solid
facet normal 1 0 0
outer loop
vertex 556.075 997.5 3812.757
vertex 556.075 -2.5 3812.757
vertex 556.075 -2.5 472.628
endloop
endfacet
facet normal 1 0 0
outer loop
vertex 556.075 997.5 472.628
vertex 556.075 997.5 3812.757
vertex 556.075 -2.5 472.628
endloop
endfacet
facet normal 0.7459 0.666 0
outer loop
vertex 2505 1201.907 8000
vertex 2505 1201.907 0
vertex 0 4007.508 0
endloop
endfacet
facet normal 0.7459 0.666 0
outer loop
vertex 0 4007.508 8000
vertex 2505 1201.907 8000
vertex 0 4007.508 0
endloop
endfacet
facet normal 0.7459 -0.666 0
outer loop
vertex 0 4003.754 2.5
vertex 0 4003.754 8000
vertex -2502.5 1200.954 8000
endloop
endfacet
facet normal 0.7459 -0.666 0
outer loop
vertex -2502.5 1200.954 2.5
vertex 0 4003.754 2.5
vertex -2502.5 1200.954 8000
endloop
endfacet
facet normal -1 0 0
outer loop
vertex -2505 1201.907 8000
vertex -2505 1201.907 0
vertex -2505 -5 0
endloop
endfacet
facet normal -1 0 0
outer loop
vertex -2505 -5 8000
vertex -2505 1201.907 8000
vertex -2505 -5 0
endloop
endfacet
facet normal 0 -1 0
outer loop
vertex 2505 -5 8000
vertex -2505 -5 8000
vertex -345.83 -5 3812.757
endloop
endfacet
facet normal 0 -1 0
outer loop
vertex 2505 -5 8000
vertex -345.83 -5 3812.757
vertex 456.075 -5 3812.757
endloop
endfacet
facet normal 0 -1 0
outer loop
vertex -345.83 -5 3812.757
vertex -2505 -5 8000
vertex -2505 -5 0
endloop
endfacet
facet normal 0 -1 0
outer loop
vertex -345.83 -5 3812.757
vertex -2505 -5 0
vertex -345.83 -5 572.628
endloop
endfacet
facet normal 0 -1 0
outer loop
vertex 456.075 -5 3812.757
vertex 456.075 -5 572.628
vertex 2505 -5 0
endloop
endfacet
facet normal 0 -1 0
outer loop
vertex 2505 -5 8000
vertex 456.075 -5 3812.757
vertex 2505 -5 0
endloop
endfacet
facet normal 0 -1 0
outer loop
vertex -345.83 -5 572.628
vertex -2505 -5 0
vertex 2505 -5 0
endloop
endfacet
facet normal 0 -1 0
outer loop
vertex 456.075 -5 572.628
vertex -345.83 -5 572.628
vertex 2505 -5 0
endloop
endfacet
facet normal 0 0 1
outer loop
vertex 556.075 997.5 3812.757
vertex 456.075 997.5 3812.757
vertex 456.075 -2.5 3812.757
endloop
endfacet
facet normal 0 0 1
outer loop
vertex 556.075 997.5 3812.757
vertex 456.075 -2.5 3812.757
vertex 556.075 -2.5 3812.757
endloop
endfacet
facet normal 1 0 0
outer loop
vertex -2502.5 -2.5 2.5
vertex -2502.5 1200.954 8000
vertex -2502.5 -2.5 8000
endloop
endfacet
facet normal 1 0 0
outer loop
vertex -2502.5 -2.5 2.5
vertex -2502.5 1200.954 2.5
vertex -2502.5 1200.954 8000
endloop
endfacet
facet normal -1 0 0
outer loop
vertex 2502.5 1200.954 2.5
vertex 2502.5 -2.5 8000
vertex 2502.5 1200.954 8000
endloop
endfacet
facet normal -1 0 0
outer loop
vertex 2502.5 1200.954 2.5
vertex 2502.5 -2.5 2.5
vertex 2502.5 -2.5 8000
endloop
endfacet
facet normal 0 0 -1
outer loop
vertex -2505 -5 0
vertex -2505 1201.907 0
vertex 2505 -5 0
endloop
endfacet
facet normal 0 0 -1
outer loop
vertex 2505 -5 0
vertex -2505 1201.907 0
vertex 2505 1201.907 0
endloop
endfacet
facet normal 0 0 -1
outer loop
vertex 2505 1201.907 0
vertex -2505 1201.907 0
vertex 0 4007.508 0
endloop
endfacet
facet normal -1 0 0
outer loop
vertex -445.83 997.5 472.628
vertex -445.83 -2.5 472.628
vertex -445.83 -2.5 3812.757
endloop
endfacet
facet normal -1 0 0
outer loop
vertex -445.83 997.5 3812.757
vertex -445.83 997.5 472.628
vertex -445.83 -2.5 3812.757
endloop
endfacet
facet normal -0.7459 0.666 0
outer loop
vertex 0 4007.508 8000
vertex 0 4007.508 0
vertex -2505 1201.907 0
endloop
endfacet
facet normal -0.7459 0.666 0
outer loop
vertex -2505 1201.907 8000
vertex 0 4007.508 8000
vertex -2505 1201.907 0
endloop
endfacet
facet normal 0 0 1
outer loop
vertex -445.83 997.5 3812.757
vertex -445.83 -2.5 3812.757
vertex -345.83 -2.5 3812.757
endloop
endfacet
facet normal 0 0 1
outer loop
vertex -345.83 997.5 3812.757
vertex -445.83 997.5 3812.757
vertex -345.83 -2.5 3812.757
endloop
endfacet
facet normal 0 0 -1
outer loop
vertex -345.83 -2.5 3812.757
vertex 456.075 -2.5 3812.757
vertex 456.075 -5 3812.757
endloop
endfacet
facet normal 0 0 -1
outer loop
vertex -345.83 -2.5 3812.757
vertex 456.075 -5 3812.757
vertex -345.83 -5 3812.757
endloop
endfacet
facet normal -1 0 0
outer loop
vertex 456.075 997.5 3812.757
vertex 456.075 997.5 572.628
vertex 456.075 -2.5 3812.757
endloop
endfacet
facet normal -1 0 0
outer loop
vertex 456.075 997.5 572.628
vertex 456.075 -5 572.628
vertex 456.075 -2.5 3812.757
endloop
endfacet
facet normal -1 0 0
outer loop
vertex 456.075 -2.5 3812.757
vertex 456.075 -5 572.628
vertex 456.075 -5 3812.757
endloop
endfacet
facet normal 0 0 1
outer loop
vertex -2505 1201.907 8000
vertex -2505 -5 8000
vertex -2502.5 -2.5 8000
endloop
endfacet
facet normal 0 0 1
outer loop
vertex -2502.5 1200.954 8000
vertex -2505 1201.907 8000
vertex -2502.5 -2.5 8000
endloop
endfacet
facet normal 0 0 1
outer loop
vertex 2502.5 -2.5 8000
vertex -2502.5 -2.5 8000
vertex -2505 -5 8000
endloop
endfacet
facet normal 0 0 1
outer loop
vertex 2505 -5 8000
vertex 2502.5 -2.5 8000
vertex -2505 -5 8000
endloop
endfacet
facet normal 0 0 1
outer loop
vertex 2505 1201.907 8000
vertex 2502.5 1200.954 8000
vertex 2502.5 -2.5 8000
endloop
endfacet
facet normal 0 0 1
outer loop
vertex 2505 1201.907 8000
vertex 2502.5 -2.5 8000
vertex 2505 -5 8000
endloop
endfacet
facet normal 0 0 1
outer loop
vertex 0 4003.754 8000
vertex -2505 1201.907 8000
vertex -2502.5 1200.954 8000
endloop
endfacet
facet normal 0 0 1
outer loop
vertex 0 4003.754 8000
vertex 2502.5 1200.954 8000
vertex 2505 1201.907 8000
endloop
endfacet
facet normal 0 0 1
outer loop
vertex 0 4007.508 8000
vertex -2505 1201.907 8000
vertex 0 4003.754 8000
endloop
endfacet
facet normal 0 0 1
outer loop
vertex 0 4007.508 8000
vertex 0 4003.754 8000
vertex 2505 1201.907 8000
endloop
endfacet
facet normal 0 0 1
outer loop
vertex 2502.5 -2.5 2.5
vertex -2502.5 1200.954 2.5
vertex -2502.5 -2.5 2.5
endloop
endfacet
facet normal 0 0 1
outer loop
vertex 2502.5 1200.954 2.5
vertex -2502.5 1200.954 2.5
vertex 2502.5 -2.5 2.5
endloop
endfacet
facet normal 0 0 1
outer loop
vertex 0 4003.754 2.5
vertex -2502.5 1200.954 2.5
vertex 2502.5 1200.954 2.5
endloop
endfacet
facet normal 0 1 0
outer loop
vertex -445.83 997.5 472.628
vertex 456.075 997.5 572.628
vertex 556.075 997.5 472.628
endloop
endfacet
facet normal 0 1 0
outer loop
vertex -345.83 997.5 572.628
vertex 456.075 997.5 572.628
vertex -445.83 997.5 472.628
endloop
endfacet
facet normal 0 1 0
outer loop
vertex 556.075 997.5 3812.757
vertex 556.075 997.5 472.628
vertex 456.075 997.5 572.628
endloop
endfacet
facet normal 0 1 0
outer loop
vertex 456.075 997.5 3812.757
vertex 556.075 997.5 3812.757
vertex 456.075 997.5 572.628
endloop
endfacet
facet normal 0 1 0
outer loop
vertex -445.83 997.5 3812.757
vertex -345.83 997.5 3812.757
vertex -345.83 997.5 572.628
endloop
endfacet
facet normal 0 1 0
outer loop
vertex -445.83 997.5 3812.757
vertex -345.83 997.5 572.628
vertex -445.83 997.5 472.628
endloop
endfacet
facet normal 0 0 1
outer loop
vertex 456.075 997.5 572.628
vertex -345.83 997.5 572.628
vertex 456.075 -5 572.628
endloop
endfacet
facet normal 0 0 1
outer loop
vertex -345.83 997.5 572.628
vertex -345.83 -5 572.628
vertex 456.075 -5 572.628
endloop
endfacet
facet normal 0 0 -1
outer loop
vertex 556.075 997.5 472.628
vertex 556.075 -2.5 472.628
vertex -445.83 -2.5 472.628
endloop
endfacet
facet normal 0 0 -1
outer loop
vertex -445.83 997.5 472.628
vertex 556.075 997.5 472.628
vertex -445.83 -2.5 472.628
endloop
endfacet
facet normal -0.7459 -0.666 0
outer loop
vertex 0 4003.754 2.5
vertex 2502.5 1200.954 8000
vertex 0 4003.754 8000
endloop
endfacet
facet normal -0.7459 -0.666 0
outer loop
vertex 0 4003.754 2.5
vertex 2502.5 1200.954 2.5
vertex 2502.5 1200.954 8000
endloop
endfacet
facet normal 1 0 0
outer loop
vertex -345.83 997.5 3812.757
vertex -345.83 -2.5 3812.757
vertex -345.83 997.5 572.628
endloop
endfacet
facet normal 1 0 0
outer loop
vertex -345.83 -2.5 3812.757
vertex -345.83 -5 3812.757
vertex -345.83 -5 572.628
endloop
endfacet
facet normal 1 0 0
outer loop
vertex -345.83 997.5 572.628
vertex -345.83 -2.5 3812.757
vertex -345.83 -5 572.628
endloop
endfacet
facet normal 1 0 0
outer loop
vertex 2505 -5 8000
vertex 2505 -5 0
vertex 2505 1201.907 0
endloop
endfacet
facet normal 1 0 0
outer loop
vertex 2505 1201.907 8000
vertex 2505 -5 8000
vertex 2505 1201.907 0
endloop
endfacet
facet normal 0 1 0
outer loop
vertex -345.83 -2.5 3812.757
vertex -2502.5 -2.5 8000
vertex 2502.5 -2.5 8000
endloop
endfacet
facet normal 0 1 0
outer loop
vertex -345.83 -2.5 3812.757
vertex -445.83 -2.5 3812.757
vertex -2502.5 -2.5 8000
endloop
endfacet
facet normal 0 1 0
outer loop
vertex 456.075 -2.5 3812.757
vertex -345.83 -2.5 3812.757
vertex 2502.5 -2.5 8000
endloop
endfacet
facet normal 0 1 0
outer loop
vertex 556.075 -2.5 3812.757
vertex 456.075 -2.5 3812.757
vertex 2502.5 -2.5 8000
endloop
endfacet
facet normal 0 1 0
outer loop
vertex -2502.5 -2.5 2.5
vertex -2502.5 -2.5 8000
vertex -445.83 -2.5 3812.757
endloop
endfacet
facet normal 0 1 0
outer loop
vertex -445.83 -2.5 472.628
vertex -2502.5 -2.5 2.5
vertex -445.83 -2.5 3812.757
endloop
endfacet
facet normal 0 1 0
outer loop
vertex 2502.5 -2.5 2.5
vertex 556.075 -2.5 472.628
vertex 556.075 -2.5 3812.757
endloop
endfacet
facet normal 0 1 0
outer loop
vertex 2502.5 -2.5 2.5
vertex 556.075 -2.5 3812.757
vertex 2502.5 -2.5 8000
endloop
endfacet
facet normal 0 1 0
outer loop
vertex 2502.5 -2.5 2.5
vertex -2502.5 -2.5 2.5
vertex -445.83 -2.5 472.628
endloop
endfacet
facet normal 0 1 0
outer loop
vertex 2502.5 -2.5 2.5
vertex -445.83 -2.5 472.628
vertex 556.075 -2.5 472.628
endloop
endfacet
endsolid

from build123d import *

# Parameters (mm, degrees)
F1_DEPTH = 8000
F2_T     = -2.5
F3_W     = 801.9051849842
F3_H     = 3240.1288747787
F4_DEPTH = 25
F6_DEPTH = 1000


with BuildPart() as f1:
    # F0 (on Top) → F1 (new body)
    with BuildSketch(Plane.XY):
        Polygon((2505.0001144409, 1201.907373407), (0, 4007.5075015809), (-2505.0001144409, 1201.907373407), (-2505.0001144409, -5.0001144409), (2505.0001144409, -5.0001144406), align=None)
        Polygon((2500, 3e-10), (-2500, 0), (-2500, 1200), (0, 4000.0000000002), (2500, 1200), align=None, mode=Mode.SUBTRACT)
        Polygon((-2500, 1200), (-2500, 0), (2500, 3e-10), (2500, 1200), (0, 4000.0000000002), align=None)
    extrude(amount=F1_DEPTH)

    # F2
    f2_openings = [f1.faces().sort_by_distance(p)[0] for p in [
        (0, 1425.528536, 8000),
    ]]
    offset(amount=F2_T, openings=f2_openings)

    # F3 (on face) → F4 (cut)
    with BuildSketch(Plane(origin=(0, -2.5001144408, 0), x_dir=(-1, 0, 0), z_dir=(0, 1, 0))):
        with Locations((-55.122807622, 2192.6925778389)):
            Rectangle(F3_W, F3_H)
    extrude(amount=-F4_DEPTH, mode=Mode.SUBTRACT)

    # F5 (on face) → F6 (join)
    with BuildSketch(Plane(origin=(0, -2.5001144408, 0), x_dir=(-1, 0, 0), z_dir=(0, 1, 0))):
        Polygon((445.8297848701, 3812.7570152283), (345.8297848701, 3812.7570152283), (345.8297848701, 572.6281404495), (-456.0754001141, 572.6281404495), (-456.0754001141, 3812.7570152283), (-556.0754001141, 3812.7570152283), (-556.0754001141, 572.6281404495), (-556.0754001141, 472.6281404495), (445.8297848701, 472.6281404495), (445.8297848701, 572.6281404495), align=None)
    extrude(amount=F6_DEPTH)


solid = f1.part
